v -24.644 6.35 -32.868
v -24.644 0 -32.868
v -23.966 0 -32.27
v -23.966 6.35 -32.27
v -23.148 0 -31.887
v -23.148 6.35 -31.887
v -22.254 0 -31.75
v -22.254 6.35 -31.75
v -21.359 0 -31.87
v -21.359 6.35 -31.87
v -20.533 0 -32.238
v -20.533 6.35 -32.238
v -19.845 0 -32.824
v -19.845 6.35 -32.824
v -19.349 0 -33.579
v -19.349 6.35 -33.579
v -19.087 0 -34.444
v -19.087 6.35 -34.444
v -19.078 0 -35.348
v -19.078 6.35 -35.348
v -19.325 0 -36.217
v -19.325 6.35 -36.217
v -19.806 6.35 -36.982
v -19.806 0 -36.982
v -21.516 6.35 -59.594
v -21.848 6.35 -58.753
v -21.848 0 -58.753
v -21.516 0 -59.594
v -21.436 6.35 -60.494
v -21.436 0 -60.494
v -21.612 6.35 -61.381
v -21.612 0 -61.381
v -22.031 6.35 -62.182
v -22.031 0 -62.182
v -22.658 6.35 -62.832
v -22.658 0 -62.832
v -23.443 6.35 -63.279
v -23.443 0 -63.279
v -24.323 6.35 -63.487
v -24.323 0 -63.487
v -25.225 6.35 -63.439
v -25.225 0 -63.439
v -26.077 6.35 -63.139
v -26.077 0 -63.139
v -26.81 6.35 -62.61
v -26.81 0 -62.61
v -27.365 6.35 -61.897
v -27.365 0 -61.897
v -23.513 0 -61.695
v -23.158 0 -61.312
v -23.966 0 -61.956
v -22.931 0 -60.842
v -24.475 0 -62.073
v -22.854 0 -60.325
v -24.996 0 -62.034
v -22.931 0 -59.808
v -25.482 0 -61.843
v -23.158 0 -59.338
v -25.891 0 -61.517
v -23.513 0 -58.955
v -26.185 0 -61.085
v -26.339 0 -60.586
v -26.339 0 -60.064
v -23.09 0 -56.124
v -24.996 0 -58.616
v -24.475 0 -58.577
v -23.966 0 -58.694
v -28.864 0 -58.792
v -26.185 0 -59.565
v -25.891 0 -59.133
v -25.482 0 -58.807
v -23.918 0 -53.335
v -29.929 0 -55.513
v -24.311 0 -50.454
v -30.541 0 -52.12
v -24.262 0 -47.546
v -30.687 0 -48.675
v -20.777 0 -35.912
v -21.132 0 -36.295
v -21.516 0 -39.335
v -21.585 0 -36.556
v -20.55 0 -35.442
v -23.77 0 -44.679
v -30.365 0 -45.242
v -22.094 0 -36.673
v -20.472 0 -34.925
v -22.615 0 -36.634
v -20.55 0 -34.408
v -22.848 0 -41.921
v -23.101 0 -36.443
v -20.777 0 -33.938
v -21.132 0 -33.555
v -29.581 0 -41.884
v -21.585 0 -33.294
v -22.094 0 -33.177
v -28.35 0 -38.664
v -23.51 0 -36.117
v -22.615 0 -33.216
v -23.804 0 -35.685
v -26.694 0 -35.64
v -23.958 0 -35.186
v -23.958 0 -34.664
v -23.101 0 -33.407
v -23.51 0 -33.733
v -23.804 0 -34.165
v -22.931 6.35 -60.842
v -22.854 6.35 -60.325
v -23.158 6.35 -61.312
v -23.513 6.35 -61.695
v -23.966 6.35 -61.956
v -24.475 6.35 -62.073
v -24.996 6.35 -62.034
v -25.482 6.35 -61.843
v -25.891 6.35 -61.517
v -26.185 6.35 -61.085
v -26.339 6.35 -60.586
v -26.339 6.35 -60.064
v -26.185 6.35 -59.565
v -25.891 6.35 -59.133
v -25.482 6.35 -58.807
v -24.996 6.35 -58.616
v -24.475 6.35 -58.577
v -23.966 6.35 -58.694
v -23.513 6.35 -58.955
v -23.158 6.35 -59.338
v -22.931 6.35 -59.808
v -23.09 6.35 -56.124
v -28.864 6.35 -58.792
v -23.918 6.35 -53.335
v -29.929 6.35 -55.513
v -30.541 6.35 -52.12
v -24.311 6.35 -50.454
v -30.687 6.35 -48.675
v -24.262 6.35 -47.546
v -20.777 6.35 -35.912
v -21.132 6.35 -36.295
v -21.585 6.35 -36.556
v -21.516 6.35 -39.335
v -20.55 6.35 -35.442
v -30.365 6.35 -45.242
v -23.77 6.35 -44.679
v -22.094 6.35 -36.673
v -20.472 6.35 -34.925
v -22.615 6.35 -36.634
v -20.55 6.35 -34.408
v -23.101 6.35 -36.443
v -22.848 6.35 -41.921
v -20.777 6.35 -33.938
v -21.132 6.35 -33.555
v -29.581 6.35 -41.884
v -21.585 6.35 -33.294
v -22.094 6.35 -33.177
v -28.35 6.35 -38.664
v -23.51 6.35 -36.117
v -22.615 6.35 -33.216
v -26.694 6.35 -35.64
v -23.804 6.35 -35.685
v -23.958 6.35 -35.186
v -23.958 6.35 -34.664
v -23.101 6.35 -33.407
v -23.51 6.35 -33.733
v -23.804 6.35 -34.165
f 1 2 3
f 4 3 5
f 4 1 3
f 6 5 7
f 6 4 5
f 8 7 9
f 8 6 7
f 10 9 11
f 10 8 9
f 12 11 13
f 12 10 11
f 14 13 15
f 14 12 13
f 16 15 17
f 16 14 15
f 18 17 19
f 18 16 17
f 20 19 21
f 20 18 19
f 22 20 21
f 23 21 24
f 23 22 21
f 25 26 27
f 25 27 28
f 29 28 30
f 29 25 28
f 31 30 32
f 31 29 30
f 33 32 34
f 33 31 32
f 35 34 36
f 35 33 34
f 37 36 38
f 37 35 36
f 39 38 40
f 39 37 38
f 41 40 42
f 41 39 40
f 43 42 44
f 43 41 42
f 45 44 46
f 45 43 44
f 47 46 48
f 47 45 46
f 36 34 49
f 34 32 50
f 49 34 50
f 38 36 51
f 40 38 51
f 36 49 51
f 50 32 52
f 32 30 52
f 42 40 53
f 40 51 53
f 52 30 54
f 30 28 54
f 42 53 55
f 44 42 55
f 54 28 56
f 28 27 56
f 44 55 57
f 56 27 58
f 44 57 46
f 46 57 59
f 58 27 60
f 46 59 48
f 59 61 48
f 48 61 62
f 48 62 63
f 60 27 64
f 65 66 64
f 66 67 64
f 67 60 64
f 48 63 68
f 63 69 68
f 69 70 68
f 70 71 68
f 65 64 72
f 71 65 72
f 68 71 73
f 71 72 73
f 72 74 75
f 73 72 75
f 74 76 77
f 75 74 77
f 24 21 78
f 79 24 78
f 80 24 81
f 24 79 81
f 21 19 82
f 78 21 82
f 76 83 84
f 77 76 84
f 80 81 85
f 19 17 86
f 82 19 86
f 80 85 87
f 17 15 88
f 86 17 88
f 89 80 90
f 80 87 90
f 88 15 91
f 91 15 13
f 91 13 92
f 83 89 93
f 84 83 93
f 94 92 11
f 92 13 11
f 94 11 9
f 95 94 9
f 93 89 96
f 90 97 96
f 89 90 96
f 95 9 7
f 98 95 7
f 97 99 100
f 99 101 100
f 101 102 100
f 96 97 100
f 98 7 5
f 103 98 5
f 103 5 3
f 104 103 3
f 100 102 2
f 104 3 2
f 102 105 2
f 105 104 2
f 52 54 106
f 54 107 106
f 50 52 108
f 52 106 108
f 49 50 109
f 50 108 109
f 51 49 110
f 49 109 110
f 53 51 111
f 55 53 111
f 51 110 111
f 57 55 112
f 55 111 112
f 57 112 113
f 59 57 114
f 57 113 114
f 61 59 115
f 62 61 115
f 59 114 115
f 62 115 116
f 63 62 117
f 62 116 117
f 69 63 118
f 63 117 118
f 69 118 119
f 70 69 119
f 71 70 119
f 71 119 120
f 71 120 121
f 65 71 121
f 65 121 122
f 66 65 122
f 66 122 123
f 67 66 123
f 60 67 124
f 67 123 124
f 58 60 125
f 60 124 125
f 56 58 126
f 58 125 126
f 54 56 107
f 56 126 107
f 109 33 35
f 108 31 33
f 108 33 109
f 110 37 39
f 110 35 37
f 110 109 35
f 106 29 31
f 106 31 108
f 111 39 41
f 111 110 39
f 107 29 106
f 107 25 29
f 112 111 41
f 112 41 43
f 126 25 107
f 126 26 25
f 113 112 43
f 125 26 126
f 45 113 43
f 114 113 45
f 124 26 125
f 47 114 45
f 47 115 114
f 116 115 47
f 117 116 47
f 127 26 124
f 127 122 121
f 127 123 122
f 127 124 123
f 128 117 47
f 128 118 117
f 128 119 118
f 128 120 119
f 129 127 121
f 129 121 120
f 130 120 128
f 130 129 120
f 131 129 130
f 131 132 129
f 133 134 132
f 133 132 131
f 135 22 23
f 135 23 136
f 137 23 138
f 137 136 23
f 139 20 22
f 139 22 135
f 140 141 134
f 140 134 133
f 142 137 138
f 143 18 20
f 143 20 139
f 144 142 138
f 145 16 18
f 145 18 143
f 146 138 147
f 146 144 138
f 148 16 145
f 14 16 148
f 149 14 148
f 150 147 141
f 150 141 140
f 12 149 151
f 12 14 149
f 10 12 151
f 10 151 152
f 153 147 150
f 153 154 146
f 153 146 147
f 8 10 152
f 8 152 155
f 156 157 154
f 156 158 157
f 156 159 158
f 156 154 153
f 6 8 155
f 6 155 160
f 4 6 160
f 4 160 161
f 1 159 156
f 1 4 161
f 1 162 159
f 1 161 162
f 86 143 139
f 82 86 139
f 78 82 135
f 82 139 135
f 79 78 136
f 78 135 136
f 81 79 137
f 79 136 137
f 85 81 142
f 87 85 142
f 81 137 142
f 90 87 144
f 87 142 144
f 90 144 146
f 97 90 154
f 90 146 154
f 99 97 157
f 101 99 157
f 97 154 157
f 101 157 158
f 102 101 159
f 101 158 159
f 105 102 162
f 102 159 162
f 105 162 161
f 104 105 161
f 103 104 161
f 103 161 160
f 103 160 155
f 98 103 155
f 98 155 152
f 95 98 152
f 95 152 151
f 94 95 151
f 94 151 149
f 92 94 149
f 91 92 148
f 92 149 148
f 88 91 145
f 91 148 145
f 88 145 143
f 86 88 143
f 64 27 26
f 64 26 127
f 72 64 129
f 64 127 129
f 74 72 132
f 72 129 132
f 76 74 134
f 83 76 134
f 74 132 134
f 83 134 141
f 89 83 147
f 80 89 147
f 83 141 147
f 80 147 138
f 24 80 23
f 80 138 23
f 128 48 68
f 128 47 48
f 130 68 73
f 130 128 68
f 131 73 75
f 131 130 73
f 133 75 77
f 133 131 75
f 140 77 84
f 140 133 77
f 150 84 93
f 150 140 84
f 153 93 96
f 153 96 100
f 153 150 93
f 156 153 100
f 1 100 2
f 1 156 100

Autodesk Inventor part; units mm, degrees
ref_plane "YZ Plane" through (0, 0, 0) normal (1, 0, 0) x (0, 1, 0)
ref_plane "XZ Plane" through (0, 0, 0) normal (0, 1, 0) x (-1, 0, 0)
ref_plane "XY Plane" through (0, 0, 0) normal (0, 0, 1) x (1, 0, 0)
sketch "Sketch1" plane through (0, 0, 0) normal (0, 1, 0) x (-1, 0, 0)
  circle A0 centre (0, 0) radius 73.025
  line L0 (0, 0) -> (0, -73.025) construction
  line L1 (0, 0) -> (-12.6807, -71.9156)
  line L2 (0, 0) -> (12.6807, -71.9156)
  line L3 (0, 0) -> (72.3143, -10.1631)
  line L4 (0, 0) -> (64.4772, -34.2832)
  line L5 (0, 0) -> (32.0121, 65.6344)
  line L6 (0, 0) -> (52.5298, 50.7274)
  line L7 (0, 0) -> (-52.5298, 50.7274)
  line L8 (0, 0) -> (-32.0121, 65.6344)
  line L9 (0, 0) -> (-64.4772, -34.2832)
  line L10 (0, 0) -> (-72.3143, -10.1631)
  circle A1 centre (0, 0) radius 69.85
  arc A2 (4.7597, -69.6876) -> (-4.7597, -69.6876) centre (0, -69.85) ccw
  arc A3 (67.7477, -17.0079) -> (64.806, -26.0614) centre (66.4313, -21.5848) ccw
  arc A4 (37.1107, 59.1762) -> (44.8121, 53.5808) centre (41.0568, 56.5098) ccw
  arc A5 (-44.8121, 53.5808) -> (-37.1107, 59.1762) centre (-41.0568, 56.5098) ccw
  arc A6 (-64.806, -26.0614) -> (-67.7477, -17.0079) centre (-66.4313, -21.5848) ccw
  point P0 (61.6739, -32.7926)
  point P1 (69.1702, -9.7212)
  point P2 (50.2459, 48.5219)
  point P3 (30.6202, 62.7808)
  point P4 (-30.6202, 62.7808)
  point P5 (-50.2459, 48.5219)
  point P6 (-69.1702, -9.7212)
  point P7 (-61.6739, -32.7926)
  point P8 (-12.1293, -68.7888)
  point P9 (12.1293, -68.7888)
  point P10 (64.806, -26.0614)
  point P11 (67.7477, -17.0079)
  point P12 (44.8121, 53.5808)
  point P13 (37.1107, 59.1762)
  point P14 (-37.1107, 59.1762)
  point P15 (-67.7477, -17.0079)
  dimension "d0" = 146.05
  dimension "d1" = 10
  dimension "d4" = 360
  dimension "d6" = 3.175
  dimension "d10" = 9.525
  dimension "d13" = 360
extrude "Extrusion1" add sketch "Sketch1" along normal blind 6.35 contours A0 L3 A1 L6 | L5 A1 L8 A0 | A1 L3 L6 | L6 L5 A1 A4 | A0 L2 A1 L4 | A1 A3 L4 L3 | L5 L8 A1 | L2 A1 A2 L1 | L4 A1 L2 | L10 A1 L7 | L7 A1 A5 L8 | L1 A1 L9 | L9 A1 A6 L10 | L7 A1 L10 A0 | L1 A0 L9 A1
fillet "Fillet1" radius 1.5875 30 edges at (30.6202, 3.175, 62.7808) (32.0121, 3.175, 65.6344) (-30.6202, 3.175, 62.7808) (-32.0121, 3.175, 65.6344) (-52.5298, 3.175, 50.7274) (-50.2459, 3.175, 48.5219) (52.5298, 3.175, 50.7274) (50.2459, 3.175, 48.5219) (64.4772, 3.175, -34.2832) (61.6739, 3.175, -32.7926) (72.3143, 3.175, -10.1631) (69.1702, 3.175, -9.7212) (12.6807, 3.175, -71.9156) (12.1293, 3.175, -68.7888) (-12.6807, 3.175, -71.9156) (-12.1293, 3.175, -68.7888) (-72.3143, 3.175, -10.1631) (-69.1702, 3.175, -9.7212) (-64.4772, 3.175, -34.2832) (-61.6739, 3.175, -32.7926) (37.1107, 3.175, 59.1762) (44.8121, 3.175, 53.5808) (-44.8121, 3.175, 53.5808) (-37.1107, 3.175, 59.1762) (-64.806, 3.175, -26.0614) (-67.7477, 3.175, -17.0079) (4.7597, 3.175, -69.6876) (-4.7597, 3.175, -69.6876) (67.7477, 3.175, -17.0079) (64.806, 3.175, -26.0614)
sketch "Sketch5" plane through (0, 6.35, 0) normal (0, 1, 0) x (1, 0, 0)
  line L0 (0, 0) -> (0, 65.0875) construction
  arc A0 (-4.554, 68.4564) -> (4.554, 68.4564) centre (0, 69.85) ccw projected
  circle A1 centre (0, 50.8) radius 22.225 construction
  arc A2 (63.6995, 35.7075) -> (14.2757, 71.616) centre (0, 0) ccw projected
  circle A3 centre (-24.6062, 60.325) radius 1.7526
  circle A4 centre (-24.6062, 60.325) radius 3.175
  circle A5 centre (-22.225, 34.925) radius 3.175
  circle A6 centre (-22.225, 34.925) radius 1.7526
  circle A7 centre (24.6062, 60.325) radius 1.7526
  circle A8 centre (24.6062, 60.325) radius 3.175
  circle A9 centre (22.225, 34.925) radius 3.175
  circle A10 centre (22.225, 34.925) radius 1.7526
  arc A11 (6.2133, 69.5731) -> (4.554, 68.4564) centre (6.0721, 67.9919) ccw projected
  arc A12 (6.2133, 69.5731) -> (4.554, 68.4564) centre (6.0721, 67.9919) ccw
  arc A13 (-4.554, 68.4564) -> (-6.2133, 69.5731) centre (-6.0721, 67.9919) ccw projected
  arc A14 (-4.554, 68.4564) -> (-6.2133, 69.5731) centre (-6.0721, 67.9919) ccw
  arc A15 (-12.4019, 70.3348) -> (-10.5977, 69.0414) centre (-10.8385, 70.6105) ccw projected
  arc A16 (10.5977, 69.0414) -> (12.4019, 70.3348) centre (10.8385, 70.6105) ccw projected
  arc A17 (10.5977, 69.0414) -> (6.2133, 69.5731) centre (0, 0) ccw projected
  arc A18 (10.5977, 69.0414) -> (11.9875, 69.515) centre (10.8385, 70.6105) ccw
  arc A19 (-6.2133, 69.5731) -> (-10.5977, 69.0414) centre (0, 0) ccw
  arc A20 (-14.2757, 71.616) -> (-63.6995, 35.7075) centre (0, 0) ccw projected
  line L1 (-28.4451, 67.2572) -> (-25.3861, 34.6286) construction
  line L2 (-22.7046, 31.7864) -> (-3.3572, 28.83) construction
  line L3 (28.4451, 67.2572) -> (25.3861, 34.6286) construction
  line L4 (22.7046, 31.7864) -> (3.3572, 28.83) construction
  circle A21 centre (0, 0) radius 73.025
  circle A22 centre (0, 50.8) radius 19.05 construction
  arc A23 (-27.365, 61.8966) -> (-24.6436, 32.868) centre (-5.295, 49.3238) ccw
  arc A24 (-21.8475, 58.7534) -> (-19.8064, 36.982) centre (-5.295, 49.3238) ccw
  point P0 (-63.6995, 35.7075)
  point P1 (-9.2869, 69.2299)
  point P2 (9.2869, 69.2299)
  point P3 (-5.0165, 69.1776)
  point P4 (5.0165, 69.1776)
  point P5 (14.2757, 71.616)
  dimension "d40" = 44.45
  dimension "d41" = 3.5052
  dimension "d42" = 6.35
  dimension "d43" = 9.525
  dimension "d44" = 24.6062
  dimension "d45" = 6.35
  dimension "d46" = 3.5052
  dimension "d47" = 15.875
  dimension "d48" = 22.225
  dimension "d70" = 38.1
  dimension "d72" = 25.4
  dimension "d73" = 19.05
extrude "Extrusion3" cut sketch "Sketch5" against normal blind 25.4 contours A21 A20 A2 | A3 | A6 | A7 | A8 | A9 | A10
equation "\"d45\" = d42"
equation "\"d46\" = d41"
properties part number "Top Plate" material "Nylon 6/6"
